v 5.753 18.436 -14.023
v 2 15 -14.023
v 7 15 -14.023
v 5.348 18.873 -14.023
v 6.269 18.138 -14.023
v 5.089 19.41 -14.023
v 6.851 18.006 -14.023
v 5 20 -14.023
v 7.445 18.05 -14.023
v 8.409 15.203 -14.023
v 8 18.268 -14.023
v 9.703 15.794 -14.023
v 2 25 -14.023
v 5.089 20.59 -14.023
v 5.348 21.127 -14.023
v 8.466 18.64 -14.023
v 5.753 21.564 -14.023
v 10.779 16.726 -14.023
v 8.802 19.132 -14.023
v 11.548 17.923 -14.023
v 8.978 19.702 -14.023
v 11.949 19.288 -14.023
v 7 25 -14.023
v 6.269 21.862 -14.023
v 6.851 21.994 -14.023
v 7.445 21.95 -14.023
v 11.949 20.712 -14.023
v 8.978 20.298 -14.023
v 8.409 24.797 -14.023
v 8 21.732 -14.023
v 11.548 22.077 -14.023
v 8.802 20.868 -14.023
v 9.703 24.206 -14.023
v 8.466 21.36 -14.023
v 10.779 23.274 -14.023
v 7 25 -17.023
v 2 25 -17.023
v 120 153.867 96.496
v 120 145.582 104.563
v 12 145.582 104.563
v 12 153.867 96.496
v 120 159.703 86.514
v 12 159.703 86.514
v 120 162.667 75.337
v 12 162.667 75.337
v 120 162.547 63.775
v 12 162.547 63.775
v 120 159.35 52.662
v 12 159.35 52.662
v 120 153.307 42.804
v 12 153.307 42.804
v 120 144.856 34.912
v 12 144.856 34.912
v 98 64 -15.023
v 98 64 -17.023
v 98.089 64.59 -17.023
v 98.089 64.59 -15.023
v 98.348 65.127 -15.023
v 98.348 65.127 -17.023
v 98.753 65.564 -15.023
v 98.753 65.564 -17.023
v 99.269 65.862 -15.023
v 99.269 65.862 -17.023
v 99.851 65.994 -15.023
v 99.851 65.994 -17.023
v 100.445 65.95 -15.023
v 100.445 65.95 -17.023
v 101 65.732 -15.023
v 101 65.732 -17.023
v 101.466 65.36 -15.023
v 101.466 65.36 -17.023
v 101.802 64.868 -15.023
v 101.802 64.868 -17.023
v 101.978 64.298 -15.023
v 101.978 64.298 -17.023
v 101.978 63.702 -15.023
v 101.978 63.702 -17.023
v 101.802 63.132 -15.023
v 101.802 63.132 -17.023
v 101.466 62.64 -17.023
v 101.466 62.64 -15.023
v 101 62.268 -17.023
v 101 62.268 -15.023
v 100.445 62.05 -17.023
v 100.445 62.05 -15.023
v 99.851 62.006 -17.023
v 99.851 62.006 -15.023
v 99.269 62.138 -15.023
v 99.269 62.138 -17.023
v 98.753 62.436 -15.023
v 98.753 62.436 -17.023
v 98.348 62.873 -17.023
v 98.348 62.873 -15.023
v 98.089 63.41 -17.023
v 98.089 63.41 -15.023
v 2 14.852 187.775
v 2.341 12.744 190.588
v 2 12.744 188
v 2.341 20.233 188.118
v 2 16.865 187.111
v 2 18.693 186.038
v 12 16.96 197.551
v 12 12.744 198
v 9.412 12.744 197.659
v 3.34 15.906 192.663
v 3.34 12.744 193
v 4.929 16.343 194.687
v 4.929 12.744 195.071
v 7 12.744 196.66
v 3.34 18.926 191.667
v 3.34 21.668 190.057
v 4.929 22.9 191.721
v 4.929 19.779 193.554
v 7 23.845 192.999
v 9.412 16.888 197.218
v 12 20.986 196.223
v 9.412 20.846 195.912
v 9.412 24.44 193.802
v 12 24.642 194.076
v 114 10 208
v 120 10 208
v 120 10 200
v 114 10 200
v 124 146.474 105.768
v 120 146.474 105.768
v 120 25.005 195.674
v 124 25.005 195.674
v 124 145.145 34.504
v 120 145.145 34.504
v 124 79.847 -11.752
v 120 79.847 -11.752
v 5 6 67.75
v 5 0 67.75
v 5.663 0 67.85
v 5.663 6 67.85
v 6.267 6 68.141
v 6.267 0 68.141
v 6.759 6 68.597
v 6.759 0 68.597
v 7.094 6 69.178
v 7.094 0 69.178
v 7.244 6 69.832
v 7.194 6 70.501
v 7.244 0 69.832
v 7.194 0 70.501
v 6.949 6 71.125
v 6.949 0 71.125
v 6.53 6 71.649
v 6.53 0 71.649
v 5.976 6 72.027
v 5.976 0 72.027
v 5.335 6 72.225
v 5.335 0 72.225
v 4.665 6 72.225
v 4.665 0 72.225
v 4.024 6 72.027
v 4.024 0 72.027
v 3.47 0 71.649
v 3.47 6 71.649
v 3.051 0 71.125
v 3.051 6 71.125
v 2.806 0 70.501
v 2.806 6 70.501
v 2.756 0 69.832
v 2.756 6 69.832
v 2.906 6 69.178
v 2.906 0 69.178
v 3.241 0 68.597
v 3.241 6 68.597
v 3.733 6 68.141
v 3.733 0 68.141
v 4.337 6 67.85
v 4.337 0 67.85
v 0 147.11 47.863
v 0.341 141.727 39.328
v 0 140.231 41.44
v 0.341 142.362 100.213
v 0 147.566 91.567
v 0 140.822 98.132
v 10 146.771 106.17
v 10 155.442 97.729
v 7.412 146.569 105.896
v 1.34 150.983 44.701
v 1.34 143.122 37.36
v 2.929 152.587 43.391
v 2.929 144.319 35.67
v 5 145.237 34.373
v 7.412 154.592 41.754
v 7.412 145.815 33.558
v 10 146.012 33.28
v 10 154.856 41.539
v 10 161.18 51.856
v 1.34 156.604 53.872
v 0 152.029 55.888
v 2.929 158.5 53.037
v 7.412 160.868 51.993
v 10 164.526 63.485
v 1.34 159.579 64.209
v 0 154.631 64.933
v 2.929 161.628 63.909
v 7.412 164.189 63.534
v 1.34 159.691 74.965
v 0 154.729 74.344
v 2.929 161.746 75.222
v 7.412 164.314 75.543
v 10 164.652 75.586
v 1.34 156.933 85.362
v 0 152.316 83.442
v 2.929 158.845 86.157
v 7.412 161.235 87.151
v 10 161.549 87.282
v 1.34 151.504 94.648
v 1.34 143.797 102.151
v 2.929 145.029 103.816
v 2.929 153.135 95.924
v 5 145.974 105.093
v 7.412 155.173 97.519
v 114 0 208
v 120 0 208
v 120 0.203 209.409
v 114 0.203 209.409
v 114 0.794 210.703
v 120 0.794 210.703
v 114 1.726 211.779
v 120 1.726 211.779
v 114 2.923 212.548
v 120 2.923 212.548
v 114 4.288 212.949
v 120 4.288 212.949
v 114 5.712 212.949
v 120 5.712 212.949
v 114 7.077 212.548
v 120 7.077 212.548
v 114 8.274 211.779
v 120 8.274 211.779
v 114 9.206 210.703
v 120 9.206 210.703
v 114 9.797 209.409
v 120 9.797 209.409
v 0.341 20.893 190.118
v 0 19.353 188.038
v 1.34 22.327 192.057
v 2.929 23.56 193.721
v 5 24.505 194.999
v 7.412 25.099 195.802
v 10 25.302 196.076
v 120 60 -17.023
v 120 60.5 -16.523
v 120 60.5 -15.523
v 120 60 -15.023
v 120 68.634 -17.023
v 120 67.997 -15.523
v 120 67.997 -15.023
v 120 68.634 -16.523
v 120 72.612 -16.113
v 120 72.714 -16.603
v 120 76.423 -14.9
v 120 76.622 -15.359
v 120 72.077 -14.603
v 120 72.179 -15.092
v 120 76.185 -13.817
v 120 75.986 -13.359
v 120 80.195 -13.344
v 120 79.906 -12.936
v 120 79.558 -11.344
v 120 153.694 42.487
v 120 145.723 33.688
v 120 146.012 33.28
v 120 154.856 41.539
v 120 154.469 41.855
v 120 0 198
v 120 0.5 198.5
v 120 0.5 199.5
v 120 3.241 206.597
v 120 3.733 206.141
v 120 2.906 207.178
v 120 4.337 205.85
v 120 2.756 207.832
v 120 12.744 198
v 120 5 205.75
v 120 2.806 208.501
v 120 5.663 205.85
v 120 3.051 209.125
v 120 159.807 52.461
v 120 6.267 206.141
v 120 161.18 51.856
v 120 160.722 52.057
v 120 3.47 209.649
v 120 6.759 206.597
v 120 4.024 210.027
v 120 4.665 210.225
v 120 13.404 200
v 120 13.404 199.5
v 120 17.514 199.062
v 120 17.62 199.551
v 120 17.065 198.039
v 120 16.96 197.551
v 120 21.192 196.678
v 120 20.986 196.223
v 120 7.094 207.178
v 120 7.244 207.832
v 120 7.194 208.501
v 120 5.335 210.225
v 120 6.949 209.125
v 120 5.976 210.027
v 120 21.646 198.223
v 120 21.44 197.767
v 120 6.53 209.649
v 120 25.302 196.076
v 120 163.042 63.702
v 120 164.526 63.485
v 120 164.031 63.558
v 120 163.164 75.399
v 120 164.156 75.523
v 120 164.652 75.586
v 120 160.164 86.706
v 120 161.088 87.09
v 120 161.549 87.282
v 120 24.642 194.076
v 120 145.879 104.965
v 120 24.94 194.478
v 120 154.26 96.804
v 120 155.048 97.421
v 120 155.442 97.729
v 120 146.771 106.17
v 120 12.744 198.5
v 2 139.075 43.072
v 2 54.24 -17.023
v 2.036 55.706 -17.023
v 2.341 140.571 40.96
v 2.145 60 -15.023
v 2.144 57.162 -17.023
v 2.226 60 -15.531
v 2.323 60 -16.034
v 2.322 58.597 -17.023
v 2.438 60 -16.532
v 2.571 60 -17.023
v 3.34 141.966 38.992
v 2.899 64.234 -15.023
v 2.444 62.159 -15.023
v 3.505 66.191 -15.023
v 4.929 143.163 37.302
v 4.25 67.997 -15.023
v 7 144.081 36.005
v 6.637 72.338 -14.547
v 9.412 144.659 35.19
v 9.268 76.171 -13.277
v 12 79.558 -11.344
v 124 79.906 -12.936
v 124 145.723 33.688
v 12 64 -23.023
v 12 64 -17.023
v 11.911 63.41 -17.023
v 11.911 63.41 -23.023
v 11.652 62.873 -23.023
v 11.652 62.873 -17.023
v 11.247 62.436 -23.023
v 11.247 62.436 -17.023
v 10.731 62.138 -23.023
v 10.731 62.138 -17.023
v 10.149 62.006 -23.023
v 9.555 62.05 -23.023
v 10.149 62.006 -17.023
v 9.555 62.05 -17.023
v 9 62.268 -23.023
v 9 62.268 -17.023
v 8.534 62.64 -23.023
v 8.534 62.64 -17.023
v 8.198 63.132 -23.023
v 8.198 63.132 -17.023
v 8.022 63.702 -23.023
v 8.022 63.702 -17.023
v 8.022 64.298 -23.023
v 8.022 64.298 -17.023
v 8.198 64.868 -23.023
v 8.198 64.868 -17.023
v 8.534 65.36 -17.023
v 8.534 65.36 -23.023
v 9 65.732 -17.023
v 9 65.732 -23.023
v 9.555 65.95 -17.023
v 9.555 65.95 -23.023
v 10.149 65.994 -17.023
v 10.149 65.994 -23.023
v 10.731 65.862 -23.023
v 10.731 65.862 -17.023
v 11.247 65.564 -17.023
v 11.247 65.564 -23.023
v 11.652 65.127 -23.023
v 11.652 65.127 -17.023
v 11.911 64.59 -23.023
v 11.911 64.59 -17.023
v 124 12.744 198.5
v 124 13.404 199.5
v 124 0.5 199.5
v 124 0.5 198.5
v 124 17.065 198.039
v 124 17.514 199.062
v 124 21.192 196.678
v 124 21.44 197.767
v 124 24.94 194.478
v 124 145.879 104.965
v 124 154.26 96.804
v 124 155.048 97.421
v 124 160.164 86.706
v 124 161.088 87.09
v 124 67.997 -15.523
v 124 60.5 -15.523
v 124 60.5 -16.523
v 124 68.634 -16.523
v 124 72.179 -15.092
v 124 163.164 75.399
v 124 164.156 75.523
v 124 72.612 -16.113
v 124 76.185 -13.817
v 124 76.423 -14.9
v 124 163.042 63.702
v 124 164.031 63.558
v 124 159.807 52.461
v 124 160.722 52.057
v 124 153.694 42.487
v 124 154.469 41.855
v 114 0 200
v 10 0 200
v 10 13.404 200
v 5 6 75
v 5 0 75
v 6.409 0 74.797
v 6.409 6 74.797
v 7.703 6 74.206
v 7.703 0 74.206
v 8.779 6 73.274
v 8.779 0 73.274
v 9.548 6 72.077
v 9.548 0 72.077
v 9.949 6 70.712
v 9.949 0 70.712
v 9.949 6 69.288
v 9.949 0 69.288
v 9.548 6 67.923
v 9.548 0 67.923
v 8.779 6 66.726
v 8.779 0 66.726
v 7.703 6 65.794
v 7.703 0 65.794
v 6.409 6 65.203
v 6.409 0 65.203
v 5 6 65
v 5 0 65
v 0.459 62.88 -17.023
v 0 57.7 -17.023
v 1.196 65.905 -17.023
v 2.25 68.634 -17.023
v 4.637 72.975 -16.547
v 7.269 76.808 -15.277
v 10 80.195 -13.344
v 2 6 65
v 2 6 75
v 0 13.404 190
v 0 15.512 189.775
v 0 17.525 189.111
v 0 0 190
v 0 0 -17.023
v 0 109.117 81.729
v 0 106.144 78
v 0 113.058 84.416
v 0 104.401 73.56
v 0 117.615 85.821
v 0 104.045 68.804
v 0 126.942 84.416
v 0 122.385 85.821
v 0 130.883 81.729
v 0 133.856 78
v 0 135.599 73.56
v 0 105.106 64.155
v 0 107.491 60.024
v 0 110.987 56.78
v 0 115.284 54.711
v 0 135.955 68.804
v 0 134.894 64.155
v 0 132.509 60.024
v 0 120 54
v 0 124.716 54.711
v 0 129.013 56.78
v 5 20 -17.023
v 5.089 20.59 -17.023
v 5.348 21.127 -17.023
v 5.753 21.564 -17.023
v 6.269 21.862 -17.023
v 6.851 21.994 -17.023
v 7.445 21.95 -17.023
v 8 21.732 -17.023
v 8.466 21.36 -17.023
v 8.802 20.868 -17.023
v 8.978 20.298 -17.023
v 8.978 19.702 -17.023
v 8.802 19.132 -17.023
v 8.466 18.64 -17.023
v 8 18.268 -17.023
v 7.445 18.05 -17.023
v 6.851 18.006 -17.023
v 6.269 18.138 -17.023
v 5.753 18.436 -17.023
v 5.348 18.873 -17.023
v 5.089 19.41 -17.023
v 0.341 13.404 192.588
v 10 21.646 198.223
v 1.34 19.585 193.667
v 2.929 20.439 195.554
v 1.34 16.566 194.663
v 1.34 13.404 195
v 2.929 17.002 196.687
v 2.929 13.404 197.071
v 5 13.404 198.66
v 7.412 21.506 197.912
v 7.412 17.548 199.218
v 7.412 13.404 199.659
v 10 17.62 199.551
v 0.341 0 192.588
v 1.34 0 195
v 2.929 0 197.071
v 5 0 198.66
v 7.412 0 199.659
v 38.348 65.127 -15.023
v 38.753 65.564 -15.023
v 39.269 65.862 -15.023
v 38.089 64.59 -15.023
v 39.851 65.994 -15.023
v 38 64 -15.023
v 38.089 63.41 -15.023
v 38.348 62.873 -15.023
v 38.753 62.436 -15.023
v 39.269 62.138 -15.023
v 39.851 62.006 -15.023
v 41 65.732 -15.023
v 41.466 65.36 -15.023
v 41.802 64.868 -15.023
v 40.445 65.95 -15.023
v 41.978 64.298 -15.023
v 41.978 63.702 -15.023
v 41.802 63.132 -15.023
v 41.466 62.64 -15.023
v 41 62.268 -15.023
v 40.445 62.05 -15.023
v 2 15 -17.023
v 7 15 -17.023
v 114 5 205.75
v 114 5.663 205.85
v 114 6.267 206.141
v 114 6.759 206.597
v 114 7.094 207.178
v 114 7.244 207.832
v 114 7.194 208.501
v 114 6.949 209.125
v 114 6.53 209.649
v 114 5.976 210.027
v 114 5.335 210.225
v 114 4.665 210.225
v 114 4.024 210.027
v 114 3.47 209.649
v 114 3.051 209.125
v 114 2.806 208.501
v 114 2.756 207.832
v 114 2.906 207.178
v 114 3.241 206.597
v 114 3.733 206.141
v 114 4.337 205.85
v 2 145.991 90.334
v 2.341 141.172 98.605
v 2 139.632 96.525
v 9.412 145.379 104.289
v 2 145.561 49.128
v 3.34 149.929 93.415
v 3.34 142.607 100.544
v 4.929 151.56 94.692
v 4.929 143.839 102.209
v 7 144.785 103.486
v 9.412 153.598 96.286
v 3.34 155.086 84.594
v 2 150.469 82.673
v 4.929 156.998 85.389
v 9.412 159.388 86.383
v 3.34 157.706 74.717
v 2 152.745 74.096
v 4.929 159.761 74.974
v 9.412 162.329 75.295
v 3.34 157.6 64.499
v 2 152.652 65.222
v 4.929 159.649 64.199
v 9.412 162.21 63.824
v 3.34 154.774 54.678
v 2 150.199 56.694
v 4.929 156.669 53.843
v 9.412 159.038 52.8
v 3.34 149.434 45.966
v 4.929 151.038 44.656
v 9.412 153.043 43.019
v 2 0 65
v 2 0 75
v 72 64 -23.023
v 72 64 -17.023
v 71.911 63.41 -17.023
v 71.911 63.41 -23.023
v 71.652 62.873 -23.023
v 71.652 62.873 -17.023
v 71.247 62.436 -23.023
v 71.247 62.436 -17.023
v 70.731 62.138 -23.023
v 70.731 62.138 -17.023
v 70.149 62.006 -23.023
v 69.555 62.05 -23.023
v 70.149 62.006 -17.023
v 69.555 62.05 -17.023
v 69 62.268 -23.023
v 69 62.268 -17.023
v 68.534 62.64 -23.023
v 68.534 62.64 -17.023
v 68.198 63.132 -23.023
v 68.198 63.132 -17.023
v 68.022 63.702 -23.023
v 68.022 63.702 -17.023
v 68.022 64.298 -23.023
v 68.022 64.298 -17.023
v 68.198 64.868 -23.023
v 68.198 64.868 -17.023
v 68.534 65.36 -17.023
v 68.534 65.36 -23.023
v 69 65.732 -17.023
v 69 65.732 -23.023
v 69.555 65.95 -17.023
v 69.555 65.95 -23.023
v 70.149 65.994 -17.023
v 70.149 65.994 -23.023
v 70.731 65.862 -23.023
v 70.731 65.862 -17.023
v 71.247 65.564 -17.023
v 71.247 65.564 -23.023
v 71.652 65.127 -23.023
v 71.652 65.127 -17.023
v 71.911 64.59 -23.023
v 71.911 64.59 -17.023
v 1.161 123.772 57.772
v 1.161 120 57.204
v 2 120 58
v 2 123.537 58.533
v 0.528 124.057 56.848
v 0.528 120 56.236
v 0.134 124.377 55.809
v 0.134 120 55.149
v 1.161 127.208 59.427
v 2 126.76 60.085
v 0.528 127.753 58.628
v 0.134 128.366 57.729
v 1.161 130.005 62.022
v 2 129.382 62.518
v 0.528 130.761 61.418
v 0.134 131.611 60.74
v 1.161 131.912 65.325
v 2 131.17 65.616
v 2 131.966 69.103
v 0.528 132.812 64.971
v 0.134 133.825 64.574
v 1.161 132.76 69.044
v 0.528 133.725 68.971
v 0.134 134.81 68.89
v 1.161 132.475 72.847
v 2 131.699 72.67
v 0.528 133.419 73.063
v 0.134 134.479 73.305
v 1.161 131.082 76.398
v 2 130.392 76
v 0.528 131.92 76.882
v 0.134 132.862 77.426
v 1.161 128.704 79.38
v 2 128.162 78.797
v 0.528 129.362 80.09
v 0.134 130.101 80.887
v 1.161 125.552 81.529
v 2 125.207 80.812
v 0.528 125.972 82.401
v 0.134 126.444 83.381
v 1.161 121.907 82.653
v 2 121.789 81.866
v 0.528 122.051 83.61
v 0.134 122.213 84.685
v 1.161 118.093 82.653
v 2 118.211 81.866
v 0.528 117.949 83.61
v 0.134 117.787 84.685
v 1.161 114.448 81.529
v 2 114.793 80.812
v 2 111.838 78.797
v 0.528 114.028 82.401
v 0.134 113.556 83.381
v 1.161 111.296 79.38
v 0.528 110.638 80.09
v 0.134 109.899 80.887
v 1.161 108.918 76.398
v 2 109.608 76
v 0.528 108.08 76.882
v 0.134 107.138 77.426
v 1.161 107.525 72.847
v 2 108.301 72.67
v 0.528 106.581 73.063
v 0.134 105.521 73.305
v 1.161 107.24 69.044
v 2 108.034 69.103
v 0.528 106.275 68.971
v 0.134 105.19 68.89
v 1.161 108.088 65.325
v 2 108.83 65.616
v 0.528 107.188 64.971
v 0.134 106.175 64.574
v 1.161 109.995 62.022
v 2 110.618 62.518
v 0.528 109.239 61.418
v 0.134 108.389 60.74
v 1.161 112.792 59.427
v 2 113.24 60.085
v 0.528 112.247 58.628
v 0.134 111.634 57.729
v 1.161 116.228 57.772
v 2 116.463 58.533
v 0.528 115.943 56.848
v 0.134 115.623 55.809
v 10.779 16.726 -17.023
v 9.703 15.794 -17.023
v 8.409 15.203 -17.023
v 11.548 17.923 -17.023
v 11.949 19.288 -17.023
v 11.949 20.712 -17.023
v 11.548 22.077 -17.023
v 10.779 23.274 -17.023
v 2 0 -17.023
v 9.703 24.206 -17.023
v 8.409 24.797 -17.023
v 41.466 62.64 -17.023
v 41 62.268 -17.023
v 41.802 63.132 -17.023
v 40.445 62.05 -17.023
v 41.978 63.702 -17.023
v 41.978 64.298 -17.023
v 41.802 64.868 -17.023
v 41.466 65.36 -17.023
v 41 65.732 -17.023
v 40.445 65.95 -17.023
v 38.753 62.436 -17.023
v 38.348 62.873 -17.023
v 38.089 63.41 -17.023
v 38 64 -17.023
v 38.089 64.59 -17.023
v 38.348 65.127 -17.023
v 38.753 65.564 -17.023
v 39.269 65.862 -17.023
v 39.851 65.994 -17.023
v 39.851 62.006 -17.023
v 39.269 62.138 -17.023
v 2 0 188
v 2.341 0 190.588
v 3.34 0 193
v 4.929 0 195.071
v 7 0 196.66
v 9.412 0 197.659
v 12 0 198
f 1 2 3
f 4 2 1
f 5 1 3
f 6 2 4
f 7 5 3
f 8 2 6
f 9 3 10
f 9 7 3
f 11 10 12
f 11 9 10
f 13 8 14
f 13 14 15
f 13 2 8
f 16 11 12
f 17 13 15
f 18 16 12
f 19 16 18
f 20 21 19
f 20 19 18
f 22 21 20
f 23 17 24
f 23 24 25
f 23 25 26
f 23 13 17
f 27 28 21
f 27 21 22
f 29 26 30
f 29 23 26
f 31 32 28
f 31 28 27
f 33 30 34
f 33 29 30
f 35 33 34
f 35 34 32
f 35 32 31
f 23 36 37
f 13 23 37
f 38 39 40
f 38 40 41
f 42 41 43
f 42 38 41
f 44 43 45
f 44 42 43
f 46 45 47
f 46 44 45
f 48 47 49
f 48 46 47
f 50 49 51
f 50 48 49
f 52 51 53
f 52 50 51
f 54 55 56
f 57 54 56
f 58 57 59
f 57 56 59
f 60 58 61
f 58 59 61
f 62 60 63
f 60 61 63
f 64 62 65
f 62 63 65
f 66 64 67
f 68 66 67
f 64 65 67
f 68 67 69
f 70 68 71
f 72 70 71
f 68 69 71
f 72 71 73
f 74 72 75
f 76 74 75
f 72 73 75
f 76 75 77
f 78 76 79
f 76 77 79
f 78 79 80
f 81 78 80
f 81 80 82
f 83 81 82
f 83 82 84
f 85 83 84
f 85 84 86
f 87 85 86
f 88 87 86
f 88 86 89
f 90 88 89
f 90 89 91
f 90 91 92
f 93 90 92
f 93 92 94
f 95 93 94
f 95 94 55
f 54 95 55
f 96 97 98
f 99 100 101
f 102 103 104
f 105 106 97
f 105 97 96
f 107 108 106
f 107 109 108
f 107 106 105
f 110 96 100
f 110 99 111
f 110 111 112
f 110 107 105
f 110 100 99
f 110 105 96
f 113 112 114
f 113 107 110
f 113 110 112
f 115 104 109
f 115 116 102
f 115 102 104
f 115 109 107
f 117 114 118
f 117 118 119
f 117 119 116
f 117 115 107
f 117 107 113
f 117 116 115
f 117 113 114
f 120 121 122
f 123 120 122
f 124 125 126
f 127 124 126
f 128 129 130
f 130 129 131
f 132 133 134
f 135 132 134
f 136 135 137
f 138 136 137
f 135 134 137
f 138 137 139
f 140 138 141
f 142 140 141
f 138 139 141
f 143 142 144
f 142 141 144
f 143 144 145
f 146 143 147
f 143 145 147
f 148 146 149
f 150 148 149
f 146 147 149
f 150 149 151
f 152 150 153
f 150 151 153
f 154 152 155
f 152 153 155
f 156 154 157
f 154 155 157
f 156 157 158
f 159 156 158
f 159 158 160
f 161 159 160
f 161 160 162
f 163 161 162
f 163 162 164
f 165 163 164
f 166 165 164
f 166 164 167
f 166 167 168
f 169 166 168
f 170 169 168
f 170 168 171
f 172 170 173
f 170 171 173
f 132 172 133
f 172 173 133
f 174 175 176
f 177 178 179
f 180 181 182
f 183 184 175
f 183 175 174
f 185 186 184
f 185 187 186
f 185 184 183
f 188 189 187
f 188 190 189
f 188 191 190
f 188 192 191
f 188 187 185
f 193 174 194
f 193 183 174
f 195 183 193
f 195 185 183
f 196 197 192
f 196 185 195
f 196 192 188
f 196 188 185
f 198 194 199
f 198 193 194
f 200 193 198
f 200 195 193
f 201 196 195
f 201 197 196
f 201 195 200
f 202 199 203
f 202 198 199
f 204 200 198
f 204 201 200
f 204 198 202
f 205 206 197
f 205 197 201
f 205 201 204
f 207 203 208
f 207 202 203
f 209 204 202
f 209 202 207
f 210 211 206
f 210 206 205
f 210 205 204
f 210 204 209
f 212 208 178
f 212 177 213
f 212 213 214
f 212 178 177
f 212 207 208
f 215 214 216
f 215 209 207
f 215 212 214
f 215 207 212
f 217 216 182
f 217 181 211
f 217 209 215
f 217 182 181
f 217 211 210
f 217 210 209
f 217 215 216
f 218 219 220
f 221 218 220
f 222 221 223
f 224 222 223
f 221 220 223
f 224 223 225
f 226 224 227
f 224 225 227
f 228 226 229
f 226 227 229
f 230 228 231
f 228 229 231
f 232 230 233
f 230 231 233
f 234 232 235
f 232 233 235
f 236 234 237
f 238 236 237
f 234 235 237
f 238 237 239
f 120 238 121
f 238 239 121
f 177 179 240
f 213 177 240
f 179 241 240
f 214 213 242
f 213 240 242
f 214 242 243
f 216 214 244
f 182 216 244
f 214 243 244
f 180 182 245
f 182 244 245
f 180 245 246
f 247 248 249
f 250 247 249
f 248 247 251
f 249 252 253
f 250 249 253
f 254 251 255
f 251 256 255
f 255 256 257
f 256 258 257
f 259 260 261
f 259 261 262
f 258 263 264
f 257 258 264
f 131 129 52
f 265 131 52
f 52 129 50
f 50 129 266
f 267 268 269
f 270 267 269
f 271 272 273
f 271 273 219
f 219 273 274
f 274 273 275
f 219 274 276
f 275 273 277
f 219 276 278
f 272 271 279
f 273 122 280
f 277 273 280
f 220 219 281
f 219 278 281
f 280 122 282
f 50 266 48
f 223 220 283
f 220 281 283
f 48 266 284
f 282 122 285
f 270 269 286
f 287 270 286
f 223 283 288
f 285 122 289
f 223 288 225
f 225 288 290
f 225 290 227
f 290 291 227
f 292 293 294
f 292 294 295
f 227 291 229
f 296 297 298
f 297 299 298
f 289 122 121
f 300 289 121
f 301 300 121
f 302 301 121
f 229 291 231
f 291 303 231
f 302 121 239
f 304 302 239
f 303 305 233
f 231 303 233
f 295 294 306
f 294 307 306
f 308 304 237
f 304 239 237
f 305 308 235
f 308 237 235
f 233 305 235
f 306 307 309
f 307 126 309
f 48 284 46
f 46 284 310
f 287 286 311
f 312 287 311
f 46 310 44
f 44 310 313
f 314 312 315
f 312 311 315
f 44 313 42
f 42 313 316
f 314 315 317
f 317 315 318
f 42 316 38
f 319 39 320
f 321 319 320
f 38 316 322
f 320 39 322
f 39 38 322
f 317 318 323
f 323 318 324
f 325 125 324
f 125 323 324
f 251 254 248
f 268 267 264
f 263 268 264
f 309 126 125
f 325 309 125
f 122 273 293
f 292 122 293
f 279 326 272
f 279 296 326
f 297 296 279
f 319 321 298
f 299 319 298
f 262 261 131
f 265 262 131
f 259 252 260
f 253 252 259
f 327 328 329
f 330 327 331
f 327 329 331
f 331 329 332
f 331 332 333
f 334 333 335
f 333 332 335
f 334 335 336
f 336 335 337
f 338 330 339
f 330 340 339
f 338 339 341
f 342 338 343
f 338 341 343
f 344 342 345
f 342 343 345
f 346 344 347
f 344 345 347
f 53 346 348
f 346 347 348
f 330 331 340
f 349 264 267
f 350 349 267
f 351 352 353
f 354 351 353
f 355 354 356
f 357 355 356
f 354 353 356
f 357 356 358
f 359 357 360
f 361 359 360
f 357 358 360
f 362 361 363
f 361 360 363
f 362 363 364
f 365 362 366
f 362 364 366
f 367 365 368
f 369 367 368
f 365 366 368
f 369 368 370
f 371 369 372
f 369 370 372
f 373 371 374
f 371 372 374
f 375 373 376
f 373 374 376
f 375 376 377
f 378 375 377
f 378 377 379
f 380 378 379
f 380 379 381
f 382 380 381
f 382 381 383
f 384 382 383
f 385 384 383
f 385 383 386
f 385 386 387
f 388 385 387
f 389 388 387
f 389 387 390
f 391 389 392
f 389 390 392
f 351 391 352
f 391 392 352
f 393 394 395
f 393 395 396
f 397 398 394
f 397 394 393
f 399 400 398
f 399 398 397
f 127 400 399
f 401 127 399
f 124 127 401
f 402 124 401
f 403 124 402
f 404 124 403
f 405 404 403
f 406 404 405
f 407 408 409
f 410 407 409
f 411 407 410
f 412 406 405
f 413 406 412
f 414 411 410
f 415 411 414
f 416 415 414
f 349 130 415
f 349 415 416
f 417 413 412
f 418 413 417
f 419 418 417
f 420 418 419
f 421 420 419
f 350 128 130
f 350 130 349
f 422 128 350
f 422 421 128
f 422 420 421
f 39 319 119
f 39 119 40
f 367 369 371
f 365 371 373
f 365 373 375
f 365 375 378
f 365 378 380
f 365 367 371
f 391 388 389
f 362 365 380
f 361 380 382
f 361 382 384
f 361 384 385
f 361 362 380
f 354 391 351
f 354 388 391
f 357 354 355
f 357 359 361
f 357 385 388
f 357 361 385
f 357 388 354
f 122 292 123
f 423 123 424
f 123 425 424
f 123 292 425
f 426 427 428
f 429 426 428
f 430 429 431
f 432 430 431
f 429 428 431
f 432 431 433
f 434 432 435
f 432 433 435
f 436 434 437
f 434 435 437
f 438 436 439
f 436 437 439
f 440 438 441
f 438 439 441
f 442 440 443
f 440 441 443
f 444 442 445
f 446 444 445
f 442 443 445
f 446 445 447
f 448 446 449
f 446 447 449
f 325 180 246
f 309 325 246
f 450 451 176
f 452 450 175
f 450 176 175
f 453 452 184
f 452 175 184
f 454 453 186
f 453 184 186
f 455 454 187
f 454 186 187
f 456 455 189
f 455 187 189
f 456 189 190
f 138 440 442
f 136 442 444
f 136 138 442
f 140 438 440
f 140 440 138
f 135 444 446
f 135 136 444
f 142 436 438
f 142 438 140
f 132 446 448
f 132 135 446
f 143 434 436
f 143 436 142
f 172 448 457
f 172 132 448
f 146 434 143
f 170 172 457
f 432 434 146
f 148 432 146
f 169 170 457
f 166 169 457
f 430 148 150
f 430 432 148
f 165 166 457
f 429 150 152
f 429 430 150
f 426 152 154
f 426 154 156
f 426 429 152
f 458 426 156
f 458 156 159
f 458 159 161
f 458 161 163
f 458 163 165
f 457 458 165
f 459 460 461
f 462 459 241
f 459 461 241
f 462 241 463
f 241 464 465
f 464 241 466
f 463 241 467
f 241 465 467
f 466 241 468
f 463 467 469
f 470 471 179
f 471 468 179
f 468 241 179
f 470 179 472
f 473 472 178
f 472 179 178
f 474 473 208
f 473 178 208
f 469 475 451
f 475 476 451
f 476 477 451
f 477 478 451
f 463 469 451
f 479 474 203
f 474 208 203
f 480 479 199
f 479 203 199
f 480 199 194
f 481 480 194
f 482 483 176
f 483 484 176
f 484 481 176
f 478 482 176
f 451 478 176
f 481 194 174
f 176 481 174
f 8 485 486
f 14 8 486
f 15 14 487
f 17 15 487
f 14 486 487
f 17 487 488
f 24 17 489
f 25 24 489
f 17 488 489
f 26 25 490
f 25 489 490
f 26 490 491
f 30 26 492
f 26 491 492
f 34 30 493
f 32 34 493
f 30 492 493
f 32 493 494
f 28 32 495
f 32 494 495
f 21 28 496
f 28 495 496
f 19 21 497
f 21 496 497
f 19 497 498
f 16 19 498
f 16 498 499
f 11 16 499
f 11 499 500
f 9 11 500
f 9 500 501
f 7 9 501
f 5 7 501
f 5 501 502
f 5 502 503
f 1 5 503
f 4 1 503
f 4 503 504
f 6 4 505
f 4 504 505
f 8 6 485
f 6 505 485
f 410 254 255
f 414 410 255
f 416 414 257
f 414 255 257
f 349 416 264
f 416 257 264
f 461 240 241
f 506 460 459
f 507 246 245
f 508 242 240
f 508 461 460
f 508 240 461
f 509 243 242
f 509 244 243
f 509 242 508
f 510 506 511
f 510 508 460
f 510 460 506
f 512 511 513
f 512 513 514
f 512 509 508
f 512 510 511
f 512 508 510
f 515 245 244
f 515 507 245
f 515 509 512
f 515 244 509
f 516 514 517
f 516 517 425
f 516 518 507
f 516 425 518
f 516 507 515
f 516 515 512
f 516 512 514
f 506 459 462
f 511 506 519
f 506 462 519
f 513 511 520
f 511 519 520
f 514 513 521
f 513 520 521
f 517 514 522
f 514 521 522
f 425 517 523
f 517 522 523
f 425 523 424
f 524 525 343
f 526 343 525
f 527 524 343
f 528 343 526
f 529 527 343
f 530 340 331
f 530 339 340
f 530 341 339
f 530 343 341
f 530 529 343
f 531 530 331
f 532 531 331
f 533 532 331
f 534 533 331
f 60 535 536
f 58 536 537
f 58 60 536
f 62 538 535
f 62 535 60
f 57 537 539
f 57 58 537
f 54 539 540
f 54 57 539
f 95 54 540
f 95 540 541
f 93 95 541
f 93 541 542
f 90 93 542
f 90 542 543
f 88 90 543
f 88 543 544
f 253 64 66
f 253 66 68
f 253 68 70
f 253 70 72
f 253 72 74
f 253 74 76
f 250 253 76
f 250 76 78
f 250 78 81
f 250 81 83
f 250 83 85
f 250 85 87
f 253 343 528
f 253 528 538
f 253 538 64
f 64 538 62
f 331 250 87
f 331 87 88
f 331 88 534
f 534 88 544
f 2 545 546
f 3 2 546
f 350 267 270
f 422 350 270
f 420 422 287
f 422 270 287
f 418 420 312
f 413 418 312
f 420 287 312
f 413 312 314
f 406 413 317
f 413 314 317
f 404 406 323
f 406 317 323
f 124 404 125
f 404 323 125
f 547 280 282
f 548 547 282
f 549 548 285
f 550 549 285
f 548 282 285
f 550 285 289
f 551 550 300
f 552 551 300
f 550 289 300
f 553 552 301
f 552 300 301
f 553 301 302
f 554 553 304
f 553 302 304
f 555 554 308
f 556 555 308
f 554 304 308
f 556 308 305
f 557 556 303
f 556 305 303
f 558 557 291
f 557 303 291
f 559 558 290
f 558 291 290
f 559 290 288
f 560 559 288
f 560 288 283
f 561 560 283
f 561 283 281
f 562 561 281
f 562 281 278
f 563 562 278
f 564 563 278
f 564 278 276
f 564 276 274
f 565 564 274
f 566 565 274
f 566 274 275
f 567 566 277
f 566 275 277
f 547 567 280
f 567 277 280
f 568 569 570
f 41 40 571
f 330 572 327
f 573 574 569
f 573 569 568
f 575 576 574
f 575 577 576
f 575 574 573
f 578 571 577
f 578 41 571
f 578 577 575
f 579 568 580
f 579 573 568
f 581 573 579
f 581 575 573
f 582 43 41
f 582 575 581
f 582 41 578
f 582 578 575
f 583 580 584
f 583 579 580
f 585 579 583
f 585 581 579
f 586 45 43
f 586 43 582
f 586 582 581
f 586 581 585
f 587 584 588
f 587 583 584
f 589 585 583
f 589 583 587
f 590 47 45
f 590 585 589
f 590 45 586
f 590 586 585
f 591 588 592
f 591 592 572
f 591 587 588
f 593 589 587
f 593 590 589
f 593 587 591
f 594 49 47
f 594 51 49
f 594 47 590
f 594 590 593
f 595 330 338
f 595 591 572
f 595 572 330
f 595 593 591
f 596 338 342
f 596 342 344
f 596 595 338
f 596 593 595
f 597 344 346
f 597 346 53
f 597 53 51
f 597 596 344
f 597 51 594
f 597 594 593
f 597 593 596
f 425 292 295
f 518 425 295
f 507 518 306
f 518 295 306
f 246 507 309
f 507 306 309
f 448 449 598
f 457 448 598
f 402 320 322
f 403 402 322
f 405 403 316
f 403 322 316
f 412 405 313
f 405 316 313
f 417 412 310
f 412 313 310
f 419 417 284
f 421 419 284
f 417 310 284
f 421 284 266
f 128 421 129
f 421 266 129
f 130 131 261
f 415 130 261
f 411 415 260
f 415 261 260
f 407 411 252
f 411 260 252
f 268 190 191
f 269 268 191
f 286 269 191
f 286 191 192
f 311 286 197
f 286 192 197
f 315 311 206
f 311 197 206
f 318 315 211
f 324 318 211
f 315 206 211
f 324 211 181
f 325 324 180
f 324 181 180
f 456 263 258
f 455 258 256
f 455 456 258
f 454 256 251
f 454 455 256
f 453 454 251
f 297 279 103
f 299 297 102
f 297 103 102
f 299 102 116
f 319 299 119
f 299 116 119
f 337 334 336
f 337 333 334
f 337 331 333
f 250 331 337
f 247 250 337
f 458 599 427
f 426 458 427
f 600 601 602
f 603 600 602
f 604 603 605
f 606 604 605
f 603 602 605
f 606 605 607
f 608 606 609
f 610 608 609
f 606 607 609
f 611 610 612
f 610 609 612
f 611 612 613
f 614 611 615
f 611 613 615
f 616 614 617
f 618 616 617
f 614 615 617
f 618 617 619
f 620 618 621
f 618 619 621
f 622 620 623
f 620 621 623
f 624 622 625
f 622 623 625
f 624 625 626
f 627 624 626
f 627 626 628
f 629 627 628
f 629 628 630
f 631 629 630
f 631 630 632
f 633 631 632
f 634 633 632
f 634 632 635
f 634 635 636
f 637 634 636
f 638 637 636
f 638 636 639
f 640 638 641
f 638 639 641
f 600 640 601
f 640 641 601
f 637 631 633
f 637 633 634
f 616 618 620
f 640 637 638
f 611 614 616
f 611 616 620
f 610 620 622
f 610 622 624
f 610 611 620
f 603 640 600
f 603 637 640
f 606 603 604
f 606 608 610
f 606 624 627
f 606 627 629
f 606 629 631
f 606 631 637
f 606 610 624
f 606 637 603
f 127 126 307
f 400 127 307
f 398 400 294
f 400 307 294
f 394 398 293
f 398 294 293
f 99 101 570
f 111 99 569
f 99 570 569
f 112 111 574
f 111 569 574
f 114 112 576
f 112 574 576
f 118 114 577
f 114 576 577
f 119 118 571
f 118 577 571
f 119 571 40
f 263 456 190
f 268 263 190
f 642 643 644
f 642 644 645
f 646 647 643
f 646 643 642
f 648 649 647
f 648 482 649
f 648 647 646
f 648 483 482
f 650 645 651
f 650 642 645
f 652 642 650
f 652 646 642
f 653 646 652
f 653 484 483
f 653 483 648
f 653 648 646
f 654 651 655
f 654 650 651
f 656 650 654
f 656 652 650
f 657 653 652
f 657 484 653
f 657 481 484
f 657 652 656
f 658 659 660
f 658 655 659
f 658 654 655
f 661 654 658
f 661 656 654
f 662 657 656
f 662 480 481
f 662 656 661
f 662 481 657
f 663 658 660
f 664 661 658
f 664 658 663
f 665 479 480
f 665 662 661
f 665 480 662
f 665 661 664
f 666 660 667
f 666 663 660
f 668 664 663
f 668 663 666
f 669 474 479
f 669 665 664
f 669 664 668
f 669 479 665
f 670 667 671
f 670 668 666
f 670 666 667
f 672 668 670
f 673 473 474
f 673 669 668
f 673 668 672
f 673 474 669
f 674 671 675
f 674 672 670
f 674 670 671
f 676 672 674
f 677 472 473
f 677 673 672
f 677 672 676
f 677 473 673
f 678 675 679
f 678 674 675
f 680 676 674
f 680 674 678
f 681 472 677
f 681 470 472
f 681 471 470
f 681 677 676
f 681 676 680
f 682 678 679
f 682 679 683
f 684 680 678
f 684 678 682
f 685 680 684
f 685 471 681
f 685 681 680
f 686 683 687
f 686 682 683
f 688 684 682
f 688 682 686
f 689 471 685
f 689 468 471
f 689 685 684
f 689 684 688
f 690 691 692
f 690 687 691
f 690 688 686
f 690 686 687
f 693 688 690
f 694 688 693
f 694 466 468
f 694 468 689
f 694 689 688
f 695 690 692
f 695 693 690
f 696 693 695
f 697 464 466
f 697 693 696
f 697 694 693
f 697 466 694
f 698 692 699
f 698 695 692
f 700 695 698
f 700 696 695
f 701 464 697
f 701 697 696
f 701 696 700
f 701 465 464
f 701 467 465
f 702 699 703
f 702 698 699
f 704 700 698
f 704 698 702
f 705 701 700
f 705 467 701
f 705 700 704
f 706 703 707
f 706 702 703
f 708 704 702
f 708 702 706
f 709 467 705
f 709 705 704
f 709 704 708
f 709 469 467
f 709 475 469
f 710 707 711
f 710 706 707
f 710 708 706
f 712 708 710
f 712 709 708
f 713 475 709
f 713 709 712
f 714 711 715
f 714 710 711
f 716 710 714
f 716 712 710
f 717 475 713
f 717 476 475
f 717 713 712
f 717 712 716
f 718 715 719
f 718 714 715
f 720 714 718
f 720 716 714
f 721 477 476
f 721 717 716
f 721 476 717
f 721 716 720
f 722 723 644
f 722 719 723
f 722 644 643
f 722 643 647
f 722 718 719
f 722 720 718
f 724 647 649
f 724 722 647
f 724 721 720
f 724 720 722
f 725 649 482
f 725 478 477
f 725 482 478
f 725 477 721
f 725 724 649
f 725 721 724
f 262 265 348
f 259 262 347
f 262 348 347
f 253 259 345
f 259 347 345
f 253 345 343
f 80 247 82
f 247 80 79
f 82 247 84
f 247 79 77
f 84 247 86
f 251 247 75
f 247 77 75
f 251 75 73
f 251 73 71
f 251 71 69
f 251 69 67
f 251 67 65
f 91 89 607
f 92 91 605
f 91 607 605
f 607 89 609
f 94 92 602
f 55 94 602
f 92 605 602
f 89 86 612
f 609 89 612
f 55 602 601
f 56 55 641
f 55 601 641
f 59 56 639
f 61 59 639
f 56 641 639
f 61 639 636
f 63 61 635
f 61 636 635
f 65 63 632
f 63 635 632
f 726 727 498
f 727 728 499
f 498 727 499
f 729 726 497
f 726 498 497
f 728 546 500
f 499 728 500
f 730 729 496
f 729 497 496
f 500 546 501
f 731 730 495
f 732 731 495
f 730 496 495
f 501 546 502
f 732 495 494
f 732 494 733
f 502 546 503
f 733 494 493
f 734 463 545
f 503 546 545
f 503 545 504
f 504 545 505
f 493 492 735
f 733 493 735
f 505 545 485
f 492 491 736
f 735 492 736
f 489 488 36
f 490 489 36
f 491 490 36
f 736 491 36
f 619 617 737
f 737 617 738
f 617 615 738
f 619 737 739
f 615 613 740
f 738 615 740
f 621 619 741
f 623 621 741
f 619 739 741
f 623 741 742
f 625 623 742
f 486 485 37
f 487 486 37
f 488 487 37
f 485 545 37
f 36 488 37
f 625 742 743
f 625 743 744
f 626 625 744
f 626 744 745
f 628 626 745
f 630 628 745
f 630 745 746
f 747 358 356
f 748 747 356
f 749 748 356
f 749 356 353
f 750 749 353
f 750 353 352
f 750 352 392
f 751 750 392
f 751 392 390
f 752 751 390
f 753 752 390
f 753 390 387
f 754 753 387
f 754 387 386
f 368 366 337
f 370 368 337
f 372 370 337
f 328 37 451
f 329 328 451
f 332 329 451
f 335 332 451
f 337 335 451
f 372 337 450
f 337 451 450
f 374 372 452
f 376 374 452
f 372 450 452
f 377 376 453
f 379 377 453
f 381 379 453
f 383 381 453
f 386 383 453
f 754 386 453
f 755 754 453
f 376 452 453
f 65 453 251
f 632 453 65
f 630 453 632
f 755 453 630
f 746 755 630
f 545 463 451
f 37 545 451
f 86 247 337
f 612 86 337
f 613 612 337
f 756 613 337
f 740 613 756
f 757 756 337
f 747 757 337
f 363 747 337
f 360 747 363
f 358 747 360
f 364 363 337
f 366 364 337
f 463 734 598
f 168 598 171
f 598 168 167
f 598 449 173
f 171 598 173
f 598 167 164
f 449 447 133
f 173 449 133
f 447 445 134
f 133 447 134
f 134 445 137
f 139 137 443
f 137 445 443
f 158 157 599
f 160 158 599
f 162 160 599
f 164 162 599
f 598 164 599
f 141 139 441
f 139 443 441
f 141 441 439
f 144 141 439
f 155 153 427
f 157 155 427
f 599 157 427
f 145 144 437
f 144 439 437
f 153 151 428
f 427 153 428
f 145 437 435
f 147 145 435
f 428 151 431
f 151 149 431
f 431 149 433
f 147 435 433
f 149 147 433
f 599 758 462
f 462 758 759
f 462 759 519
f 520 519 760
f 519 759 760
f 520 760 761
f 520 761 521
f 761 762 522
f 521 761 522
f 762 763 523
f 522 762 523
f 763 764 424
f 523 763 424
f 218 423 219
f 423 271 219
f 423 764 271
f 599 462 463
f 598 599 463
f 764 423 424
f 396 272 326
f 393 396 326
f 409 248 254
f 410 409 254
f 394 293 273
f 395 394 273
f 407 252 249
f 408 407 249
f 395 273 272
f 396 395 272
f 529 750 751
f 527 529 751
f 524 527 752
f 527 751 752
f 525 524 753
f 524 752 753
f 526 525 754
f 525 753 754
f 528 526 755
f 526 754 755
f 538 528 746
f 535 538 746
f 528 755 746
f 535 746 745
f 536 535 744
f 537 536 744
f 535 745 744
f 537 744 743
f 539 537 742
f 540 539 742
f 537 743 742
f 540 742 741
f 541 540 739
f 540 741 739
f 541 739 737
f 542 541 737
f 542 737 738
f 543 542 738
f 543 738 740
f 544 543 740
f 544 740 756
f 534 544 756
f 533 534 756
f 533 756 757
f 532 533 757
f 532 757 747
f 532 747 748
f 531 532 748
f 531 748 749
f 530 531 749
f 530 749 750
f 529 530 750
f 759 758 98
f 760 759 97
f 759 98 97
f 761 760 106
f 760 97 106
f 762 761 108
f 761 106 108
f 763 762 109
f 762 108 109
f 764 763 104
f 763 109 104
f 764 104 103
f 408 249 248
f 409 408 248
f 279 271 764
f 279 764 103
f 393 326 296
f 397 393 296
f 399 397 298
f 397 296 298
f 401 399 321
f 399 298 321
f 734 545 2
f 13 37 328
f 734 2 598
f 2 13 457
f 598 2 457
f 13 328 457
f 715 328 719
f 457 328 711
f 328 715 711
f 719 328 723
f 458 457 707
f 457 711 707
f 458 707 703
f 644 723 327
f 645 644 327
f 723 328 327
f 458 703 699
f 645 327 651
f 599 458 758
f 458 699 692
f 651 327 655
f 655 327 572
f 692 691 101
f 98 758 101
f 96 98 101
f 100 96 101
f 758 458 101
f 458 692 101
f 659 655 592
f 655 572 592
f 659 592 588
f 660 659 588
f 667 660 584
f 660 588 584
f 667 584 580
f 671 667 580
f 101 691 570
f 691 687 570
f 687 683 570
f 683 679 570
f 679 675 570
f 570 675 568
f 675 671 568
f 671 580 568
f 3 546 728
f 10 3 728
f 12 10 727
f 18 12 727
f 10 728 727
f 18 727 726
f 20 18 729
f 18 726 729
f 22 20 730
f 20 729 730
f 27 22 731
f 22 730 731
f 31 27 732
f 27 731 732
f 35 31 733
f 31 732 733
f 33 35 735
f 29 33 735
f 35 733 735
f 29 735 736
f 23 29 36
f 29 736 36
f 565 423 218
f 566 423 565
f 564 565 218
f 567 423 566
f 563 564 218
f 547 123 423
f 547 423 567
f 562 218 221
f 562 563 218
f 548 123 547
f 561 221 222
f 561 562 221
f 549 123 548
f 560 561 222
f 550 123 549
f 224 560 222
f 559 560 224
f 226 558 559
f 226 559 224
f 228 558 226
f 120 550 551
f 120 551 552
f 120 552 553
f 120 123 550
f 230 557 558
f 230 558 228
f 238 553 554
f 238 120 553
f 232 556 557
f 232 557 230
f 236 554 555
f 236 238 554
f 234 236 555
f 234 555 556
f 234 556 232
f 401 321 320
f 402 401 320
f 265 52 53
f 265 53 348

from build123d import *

# Parameters (mm, degrees)
CROQUIS1_R              = 12
SALIENTE_EXTRUIR1_DEPTH = 120
CORTAR_EXTRUIR1_DEPTH   = 118
REDONDEO1_R             = 20
CROQUIS3_W              = 250
CROQUIS3_H              = 250
CORTAR_EXTRUIR2_DEPTH   = 298.866030678
CROQUIS4_R              = 2
CORTAR_EXTRUIR3_DEPTH   = 20
CROQUIS5_R              = 2
SALIENTE_EXTRUIR2_DEPTH = 6
REDONDEO2_R             = 10
REDONDEO4_START         = 2.145107019
REDONDEO4_DEPTH         = 118.854892981
REDONDEO4_START_2       = 4.250447227
REDONDEO4_2_DEPTH       = 115.749552773
SALIENTE_EXTRUIR3_DEPTH = 4
CROQUIS7_R              = 2.25
SALIENTE_EXTRUIR4_DEPTH = 6
CROQUIS9_R              = 2.25
SALIENTE_EXTRUIR5_DEPTH = 6
CROQUIS10_R             = 2
SALIENTE_EXTRUIR6_DEPTH = 3
REDONDEO5_R             = 5


with BuildPart() as part:
    # Croquis1 → Saliente-Extruir1 (new body)
    with BuildSketch(Plane(origin=(0, 0, 0), x_dir=(0, 0, -1), z_dir=(1, 0, 0))):
        with BuildLine():
            Line((-200, 0), (200, 0))
            Line((200, 0), (200, 45))
            Line((200, 45), (175, 70))
            Line((175, 70), (17.023437057, 70))
            Line((17.023437057, 70), (17.023437057, 75))
            Line((17.023437057, 75), (-33.279638053, 146.01182459))
            ThreePointArc((-33.279638053, 146.01182459), (-69.531086216, 164.997556821), (-106.170314621, 146.771409007))
            Line((-106.170314621, 146.771409007), (-200, 20))
            Line((-200, 20), (-200, 0))
        make_face()
        with Locations((-70, 120)):
            Circle(CROQUIS1_R, mode=Mode.SUBTRACT)
    extrude(amount=SALIENTE_EXTRUIR1_DEPTH)

    # Croquis2 → Cortar-Extruir1 (cut)
    with BuildSketch(Plane(origin=(120, 0, 0), x_dir=(0, 0, -1), z_dir=(1, 0, 0))):
        with BuildLine():
            Line((35.023437057, 60), (35.023437057, 68))
            Line((35.023437057, 68), (174.171572875, 68))
            Line((174.171572875, 68), (198, 44.171572875))
            Line((198, 44.171572875), (198, 0))
            Line((198, 0), (-198, 0))
            Line((-198, 0), (-198, 19.340364538))
            Line((-198, 19.340364538), (-104.562745082, 145.581568607))
            ThreePointArc((-104.562745082, 145.581568607), (-69.551926829, 162.997665407), (-34.91165414, 144.855743497))
            Line((-34.91165414, 144.855743497), (15.023437057, 74.363394288))
            Line((15.023437057, 74.363394288), (15.023437057, 60))
            Line((15.023437057, 60), (35.023437057, 60))
        make_face()
    extrude(amount=-CORTAR_EXTRUIR1_DEPTH, mode=Mode.SUBTRACT)

    # Redondeo1
    redondeo1_edges = [part.edges().sort_by_distance(p)[0] for p in [
        (60, 20, 200),
        (60, 70, -175),
        (60, 45, -200),
        (61, 19.340364538, 198),
        (61, 68, -174.171572875),
        (61, 44.171572875, -198),
    ]]
    fillet(redondeo1_edges, radius=REDONDEO1_R)

    # Croquis3 → Cortar-Extruir2 (cut, through all)
    with BuildSketch(Plane(origin=(0, 0, -17.023437057), x_dir=(-1, 0, 0), z_dir=(0, 0, -1))):
        with Locations((-60, 64.142135624)):
            Rectangle(CROQUIS3_W, CROQUIS3_H)
    extrude(amount=CORTAR_EXTRUIR2_DEPTH, mode=Mode.SUBTRACT)

    # Croquis4 → Cortar-Extruir3 (cut)
    with BuildSketch(Plane(origin=(0, 0, -17.023437057), x_dir=(-1, 0, 0), z_dir=(0, 0, -1))):
        with Locations((-100, 64)):
            Circle(CROQUIS4_R)
        with Locations((-40, 64)):
            Circle(CROQUIS4_R)
    extrude(amount=-CORTAR_EXTRUIR3_DEPTH, mode=Mode.SUBTRACT)

    # Croquis5 → Saliente-Extruir2 (add)
    with BuildSketch(Plane(origin=(0, 0, -17.023437057), x_dir=(-1, 0, 0), z_dir=(0, 0, -1))):
        with Locations(Location((-70, 64, 0), (0, 0, 180))):
            Circle(CROQUIS5_R)
        with Locations(Location((-10, 64, 0), (0, 0, 180))):
            Circle(CROQUIS5_R)
    extrude(amount=SALIENTE_EXTRUIR2_DEPTH)

    # Redondeo2
    redondeo2_edges = [part.edges().sort_by_distance(p)[0] for p in [
        (0, 110.505912295, 8.128100498),
        (0, 6.701822688, 200),
        (0, 19.668072416, 198.993602972),
        (0, 86.036729193, 151.123005004),
        (0, 164.997556821, 69.531086216),
        (2, 6.372004957, 198),
        (2, 19.008436953, 196.993602972),
        (2, 109.609568893, 9.944108542),
        (2, 162.997665407, 69.551926829),
        (2, 85.111991262, 149.319220235),
    ]]
    fillet(redondeo2_edges, radius=REDONDEO2_R)

    # Redondeo4: read off the stored shape, not the designer's step
    # Redondeo4 outline → Redondeo4 (cut)
    with BuildSketch(Plane.YZ.offset(REDONDEO4_START)):
        with BuildLine():
            Line((75, -17.023437057), (80.194753812, -13.343597922))
            ThreePointArc((80.194753812, -13.343597922), (74.700110648, -16.081286061), (68.633942883, -17.023437057))
            Line((68.633942883, -17.023437057), (75, -17.023437057))
        make_face()
    extrude(amount=REDONDEO4_DEPTH, mode=Mode.SUBTRACT)

    # Redondeo4 2 outline → Redondeo4 2 (add)
    with BuildSketch(Plane.YZ.offset(REDONDEO4_START_2)):
        with BuildLine():
            Line((74.363394288, -15.023437057), (79.5581481, -11.343597922))
            ThreePointArc((79.5581481, -11.343597922), (74.063504936, -14.081286061), (67.997337171, -15.023437057))
            Line((67.997337171, -15.023437057), (74.363394288, -15.023437057))
        make_face()
    extrude(amount=REDONDEO4_2_DEPTH)

    # Croquis6 → Saliente-Extruir3 (add)
    with BuildSketch(Plane(origin=(120, 0, 0), x_dir=(0, 0, -1), z_dir=(1, 0, 0))):
        with BuildLine():
            Line((16.523437057, 60.5), (16.523437057, 68.633942883))
            ThreePointArc((16.523437057, 68.633942883), (15.604839835, 74.548456453), (12.9355939, 79.905733538))
            Line((12.9355939, 79.905733538), (-33.687642075, 145.722804317))
            ThreePointArc((-33.687642075, 145.722804317), (-69.536296369, 164.497583967), (-105.768422236, 146.473948907))
            Line((-105.768422236, 146.473948907), (-195.673803002, 25.00458928))
            ThreePointArc((-195.673803002, 25.00458928), (-198.518762898, 19.51146174), (-199.5, 13.403645376))
            Line((-199.5, 13.403645376), (-199.5, 0.5))
            Line((-199.5, 0.5), (-198.5, 0.5))
            Line((-198.5, 0.5), (-198.5, 12.744009914))
            ThreePointArc((-198.5, 12.744009914), (-197.468443047, 19.165047629), (-194.477587772, 24.939874017))
            Line((-194.477587772, 24.939874017), (-104.964637467, 145.879028707))
            ThreePointArc((-104.964637467, 145.879028707), (-69.546716676, 163.49763826), (-34.503650118, 145.144763771))
            Line((-34.503650118, 145.144763771), (11.751601944, 79.847168373))
            ThreePointArc((11.751601944, 79.847168373), (14.557732286, 74.21515913), (15.523437057, 67.997337171))
            Line((15.523437057, 67.997337171), (15.523437057, 60.5))
            Line((15.523437057, 60.5), (16.523437057, 60.5))
        make_face()
    extrude(amount=SALIENTE_EXTRUIR3_DEPTH)

    # Croquis7 → Saliente-Extruir4 (add)
    with BuildSketch(Plane.XZ):
        with BuildLine():
            Line((2, 75), (5, 75))
            ThreePointArc((5, 75), (10, 70), (5, 65))
            Line((5, 65), (2, 65))
            Line((2, 65), (2, 75))
        make_face()
        with Locations(Location((5, 70, 0), (0, 0, 270))):
            Circle(CROQUIS7_R, mode=Mode.SUBTRACT)
    extrude(amount=-SALIENTE_EXTRUIR4_DEPTH)

    # Croquis9 → Saliente-Extruir5 (add)
    with BuildSketch(Plane(origin=(120, 0, 0), x_dir=(0, 0, -1), z_dir=(1, 0, 0))):
        with BuildLine():
            Line((-200, 0), (-208, 0))
            ThreePointArc((-208, 0), (-213, 5), (-208, 10))
            Line((-208, 10), (-200, 10))
            Line((-200, 10), (-200, 0))
        make_face()
        with Locations((-208, 5)):
            Circle(CROQUIS9_R, mode=Mode.SUBTRACT)
    extrude(amount=-SALIENTE_EXTRUIR5_DEPTH)

    # Croquis10 → Saliente-Extruir6 (add)
    with BuildSketch(Plane(origin=(0, 0, -17.023437057), x_dir=(-1, 0, 0), z_dir=(0, 0, -1))):
        with BuildLine():
            Line((-2, 15), (-7, 15))
            ThreePointArc((-7, 15), (-12, 20), (-7, 25))
            Line((-7, 25), (-2, 25))
            Line((-2, 25), (-2, 15))
        make_face()
        with Locations((-7, 20)):
            Circle(CROQUIS10_R, mode=Mode.SUBTRACT)
    extrude(amount=-SALIENTE_EXTRUIR6_DEPTH)

    # Redondeo5
    # the kernel refuses this fillet: 5 mm, written as the material it takes off along each edge
    with BuildSketch(Plane(origin=(0, 120, 70), x_dir=(0, 0, -1), z_dir=(0, -1, 0))) as redondeo5_piece_1:
        with BuildLine():
            CenterArc((16, 5), REDONDEO5_R, 216.869897646, 53.130102354)
            Line((12, 2), (11.92, 1.94))
            ThreePointArc((11.92, 1.94), (11.9, 1), (11.9, 0))
            Line((11.9, 0), (12, -0.1))
            Line((12, -0.1), (16, -0.1))
            Line((16, -0.1), (16, 0))
        make_face()
    revolve(axis=Axis((0, 120, 70), (1, 0, 0)), mode=Mode.SUBTRACT)


solid = part.part
